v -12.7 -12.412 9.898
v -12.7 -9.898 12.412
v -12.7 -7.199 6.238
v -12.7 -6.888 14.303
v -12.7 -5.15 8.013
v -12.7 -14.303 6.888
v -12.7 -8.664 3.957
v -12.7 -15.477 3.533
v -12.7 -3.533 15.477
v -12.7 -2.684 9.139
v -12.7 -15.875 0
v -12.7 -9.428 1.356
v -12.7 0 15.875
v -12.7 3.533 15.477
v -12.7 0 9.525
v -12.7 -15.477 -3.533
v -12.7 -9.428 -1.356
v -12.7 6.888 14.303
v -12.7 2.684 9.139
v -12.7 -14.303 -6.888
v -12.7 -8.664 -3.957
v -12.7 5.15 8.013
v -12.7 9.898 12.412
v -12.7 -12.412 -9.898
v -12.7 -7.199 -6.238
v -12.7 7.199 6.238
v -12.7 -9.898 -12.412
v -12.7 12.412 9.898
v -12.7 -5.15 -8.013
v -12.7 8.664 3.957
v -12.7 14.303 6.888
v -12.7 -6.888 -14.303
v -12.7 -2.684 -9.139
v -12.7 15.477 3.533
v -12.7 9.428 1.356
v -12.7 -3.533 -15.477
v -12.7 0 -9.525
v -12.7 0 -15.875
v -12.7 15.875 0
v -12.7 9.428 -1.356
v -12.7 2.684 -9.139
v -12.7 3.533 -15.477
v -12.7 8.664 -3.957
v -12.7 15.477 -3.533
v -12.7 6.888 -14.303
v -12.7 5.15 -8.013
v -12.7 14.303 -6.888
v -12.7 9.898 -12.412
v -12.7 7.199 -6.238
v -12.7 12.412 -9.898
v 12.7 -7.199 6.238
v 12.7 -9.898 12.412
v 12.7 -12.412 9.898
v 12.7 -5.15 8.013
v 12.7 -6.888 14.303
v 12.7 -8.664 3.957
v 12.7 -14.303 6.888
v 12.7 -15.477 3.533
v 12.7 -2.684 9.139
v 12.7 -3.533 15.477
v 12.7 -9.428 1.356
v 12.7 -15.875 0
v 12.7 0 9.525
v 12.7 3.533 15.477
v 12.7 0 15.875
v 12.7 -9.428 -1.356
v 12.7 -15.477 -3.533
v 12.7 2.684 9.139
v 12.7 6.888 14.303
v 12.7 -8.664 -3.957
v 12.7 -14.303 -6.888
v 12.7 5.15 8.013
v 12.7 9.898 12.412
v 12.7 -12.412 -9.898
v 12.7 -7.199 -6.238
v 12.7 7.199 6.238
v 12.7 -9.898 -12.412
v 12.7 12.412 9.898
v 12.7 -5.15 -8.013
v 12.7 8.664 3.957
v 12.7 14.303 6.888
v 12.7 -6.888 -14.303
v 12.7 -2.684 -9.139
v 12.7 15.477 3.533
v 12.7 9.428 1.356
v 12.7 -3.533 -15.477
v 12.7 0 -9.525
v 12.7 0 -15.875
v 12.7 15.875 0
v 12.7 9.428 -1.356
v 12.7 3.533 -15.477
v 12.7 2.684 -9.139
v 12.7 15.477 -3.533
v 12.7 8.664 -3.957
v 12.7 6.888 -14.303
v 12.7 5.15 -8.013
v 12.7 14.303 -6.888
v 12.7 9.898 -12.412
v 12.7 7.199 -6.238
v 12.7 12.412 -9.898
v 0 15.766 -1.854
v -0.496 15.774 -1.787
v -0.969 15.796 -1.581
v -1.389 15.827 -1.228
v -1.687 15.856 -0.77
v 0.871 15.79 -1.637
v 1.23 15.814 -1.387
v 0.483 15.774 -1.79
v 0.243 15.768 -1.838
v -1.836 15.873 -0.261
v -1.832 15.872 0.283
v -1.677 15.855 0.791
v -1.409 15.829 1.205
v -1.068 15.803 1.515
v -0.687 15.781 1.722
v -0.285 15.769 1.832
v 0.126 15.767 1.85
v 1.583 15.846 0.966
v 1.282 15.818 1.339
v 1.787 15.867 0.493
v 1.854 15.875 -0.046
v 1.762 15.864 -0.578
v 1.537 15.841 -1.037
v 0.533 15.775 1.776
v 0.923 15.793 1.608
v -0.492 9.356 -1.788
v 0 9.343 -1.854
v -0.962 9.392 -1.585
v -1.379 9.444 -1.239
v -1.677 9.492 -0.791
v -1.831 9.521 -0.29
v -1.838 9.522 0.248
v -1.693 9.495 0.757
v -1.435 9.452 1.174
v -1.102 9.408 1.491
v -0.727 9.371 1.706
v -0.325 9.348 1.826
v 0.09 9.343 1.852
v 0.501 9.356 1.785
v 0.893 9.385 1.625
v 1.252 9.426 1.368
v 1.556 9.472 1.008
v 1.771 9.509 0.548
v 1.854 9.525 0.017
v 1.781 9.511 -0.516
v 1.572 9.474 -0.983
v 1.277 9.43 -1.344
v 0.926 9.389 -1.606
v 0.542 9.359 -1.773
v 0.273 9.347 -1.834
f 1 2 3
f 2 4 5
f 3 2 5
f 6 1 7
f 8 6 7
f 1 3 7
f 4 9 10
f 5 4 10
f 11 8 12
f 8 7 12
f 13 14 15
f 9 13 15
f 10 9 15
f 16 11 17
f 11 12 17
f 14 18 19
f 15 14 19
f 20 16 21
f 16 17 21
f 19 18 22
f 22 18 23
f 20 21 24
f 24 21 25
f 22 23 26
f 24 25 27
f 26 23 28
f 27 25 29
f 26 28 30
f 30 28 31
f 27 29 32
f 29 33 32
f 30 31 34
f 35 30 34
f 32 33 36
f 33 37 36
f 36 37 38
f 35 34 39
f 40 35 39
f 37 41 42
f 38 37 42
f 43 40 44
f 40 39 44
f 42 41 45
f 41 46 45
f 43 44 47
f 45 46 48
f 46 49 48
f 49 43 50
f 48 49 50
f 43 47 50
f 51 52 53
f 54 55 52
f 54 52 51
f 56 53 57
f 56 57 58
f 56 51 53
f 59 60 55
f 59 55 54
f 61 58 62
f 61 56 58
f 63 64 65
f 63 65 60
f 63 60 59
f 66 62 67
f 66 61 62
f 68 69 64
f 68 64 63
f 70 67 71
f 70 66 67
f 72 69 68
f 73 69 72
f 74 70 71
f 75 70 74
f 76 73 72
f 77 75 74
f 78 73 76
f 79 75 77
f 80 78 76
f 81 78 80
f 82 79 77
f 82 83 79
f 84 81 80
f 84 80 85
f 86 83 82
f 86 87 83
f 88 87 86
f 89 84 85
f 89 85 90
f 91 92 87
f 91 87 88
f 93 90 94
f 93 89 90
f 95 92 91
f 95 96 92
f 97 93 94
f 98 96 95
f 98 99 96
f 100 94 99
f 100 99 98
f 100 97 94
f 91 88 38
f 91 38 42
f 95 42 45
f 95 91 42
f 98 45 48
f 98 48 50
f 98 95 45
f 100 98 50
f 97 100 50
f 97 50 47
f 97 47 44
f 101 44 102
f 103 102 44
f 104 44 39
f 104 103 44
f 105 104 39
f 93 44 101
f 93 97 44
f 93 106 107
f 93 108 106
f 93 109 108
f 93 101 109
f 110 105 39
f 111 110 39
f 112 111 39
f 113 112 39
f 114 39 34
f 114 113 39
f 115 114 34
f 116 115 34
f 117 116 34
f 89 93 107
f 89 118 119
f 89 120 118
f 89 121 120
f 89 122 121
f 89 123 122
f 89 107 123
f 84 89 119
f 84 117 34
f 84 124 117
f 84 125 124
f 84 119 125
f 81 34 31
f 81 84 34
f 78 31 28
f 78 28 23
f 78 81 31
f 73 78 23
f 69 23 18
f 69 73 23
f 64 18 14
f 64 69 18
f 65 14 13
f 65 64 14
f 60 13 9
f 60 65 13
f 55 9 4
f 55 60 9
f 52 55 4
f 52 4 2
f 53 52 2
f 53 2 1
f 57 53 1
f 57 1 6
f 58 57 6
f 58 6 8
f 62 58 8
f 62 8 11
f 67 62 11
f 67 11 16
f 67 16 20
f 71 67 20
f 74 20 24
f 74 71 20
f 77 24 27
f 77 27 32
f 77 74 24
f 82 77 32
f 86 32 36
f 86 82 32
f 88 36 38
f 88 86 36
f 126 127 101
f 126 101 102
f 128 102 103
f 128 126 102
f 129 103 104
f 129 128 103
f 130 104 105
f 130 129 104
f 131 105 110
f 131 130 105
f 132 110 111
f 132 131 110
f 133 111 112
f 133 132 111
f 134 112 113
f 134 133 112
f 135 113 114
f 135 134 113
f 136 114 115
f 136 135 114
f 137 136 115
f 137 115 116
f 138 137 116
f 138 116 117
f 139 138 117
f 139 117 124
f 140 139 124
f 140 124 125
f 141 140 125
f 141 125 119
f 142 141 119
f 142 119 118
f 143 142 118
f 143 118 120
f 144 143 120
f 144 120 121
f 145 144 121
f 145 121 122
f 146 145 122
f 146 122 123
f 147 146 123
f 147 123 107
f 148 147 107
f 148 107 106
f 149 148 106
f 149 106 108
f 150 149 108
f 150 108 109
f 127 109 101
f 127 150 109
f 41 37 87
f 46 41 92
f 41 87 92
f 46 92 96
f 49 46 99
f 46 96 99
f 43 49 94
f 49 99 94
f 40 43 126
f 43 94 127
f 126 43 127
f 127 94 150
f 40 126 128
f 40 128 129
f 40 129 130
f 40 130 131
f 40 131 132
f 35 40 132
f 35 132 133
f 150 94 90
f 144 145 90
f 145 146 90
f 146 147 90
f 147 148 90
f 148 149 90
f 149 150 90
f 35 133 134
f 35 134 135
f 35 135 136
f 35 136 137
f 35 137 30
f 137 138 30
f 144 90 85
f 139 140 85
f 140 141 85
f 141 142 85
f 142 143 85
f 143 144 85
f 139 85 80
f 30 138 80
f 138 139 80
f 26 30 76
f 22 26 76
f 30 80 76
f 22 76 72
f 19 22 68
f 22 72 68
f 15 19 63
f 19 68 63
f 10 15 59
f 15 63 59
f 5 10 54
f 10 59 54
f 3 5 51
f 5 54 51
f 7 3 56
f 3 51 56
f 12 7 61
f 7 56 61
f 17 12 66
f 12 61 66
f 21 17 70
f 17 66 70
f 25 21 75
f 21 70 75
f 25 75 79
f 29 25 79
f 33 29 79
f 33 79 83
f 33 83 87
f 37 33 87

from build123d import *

# Parameters (mm, degrees)
SKETCH1_R           = 15.875
BOSS_EXTRUDE1_DEPTH = 12.7
SKETCH2_R           = 9.525
F_3_4_REAM_DEPTH    = 34.89972345
SKETCH3_R           = 1.8542
F_10_32_TAP_DEPTH   = 26.793821935


with BuildPart() as part:
    # Sketch1 → Boss-Extrude1 (new, symmetric)
    with BuildSketch(Plane(origin=(0, 0, 0), x_dir=(0, 0, -1), z_dir=(1, 0, 0))):
        Circle(SKETCH1_R)
    extrude(amount=BOSS_EXTRUDE1_DEPTH, both=True)

    # Sketch2 → 3/4 Ream (cut, through all)
    with BuildSketch(Plane(origin=(12.7, 0, 0), x_dir=(0, 0, -1), z_dir=(1, 0, 0))):
        Circle(SKETCH2_R)
    extrude(amount=-F_3_4_REAM_DEPTH, mode=Mode.SUBTRACT)

    # Sketch3 → #10-32 Tap (cut, through all)
    with BuildSketch(Plane(origin=(0, 0, 0), x_dir=(1, 0, 0), z_dir=(0, 1, 0))):
        with Locations(Location((0, 0, 0), (0, 0, 90))):
            Circle(SKETCH3_R)
    extrude(amount=F_10_32_TAP_DEPTH, mode=Mode.SUBTRACT)


solid = part.part
